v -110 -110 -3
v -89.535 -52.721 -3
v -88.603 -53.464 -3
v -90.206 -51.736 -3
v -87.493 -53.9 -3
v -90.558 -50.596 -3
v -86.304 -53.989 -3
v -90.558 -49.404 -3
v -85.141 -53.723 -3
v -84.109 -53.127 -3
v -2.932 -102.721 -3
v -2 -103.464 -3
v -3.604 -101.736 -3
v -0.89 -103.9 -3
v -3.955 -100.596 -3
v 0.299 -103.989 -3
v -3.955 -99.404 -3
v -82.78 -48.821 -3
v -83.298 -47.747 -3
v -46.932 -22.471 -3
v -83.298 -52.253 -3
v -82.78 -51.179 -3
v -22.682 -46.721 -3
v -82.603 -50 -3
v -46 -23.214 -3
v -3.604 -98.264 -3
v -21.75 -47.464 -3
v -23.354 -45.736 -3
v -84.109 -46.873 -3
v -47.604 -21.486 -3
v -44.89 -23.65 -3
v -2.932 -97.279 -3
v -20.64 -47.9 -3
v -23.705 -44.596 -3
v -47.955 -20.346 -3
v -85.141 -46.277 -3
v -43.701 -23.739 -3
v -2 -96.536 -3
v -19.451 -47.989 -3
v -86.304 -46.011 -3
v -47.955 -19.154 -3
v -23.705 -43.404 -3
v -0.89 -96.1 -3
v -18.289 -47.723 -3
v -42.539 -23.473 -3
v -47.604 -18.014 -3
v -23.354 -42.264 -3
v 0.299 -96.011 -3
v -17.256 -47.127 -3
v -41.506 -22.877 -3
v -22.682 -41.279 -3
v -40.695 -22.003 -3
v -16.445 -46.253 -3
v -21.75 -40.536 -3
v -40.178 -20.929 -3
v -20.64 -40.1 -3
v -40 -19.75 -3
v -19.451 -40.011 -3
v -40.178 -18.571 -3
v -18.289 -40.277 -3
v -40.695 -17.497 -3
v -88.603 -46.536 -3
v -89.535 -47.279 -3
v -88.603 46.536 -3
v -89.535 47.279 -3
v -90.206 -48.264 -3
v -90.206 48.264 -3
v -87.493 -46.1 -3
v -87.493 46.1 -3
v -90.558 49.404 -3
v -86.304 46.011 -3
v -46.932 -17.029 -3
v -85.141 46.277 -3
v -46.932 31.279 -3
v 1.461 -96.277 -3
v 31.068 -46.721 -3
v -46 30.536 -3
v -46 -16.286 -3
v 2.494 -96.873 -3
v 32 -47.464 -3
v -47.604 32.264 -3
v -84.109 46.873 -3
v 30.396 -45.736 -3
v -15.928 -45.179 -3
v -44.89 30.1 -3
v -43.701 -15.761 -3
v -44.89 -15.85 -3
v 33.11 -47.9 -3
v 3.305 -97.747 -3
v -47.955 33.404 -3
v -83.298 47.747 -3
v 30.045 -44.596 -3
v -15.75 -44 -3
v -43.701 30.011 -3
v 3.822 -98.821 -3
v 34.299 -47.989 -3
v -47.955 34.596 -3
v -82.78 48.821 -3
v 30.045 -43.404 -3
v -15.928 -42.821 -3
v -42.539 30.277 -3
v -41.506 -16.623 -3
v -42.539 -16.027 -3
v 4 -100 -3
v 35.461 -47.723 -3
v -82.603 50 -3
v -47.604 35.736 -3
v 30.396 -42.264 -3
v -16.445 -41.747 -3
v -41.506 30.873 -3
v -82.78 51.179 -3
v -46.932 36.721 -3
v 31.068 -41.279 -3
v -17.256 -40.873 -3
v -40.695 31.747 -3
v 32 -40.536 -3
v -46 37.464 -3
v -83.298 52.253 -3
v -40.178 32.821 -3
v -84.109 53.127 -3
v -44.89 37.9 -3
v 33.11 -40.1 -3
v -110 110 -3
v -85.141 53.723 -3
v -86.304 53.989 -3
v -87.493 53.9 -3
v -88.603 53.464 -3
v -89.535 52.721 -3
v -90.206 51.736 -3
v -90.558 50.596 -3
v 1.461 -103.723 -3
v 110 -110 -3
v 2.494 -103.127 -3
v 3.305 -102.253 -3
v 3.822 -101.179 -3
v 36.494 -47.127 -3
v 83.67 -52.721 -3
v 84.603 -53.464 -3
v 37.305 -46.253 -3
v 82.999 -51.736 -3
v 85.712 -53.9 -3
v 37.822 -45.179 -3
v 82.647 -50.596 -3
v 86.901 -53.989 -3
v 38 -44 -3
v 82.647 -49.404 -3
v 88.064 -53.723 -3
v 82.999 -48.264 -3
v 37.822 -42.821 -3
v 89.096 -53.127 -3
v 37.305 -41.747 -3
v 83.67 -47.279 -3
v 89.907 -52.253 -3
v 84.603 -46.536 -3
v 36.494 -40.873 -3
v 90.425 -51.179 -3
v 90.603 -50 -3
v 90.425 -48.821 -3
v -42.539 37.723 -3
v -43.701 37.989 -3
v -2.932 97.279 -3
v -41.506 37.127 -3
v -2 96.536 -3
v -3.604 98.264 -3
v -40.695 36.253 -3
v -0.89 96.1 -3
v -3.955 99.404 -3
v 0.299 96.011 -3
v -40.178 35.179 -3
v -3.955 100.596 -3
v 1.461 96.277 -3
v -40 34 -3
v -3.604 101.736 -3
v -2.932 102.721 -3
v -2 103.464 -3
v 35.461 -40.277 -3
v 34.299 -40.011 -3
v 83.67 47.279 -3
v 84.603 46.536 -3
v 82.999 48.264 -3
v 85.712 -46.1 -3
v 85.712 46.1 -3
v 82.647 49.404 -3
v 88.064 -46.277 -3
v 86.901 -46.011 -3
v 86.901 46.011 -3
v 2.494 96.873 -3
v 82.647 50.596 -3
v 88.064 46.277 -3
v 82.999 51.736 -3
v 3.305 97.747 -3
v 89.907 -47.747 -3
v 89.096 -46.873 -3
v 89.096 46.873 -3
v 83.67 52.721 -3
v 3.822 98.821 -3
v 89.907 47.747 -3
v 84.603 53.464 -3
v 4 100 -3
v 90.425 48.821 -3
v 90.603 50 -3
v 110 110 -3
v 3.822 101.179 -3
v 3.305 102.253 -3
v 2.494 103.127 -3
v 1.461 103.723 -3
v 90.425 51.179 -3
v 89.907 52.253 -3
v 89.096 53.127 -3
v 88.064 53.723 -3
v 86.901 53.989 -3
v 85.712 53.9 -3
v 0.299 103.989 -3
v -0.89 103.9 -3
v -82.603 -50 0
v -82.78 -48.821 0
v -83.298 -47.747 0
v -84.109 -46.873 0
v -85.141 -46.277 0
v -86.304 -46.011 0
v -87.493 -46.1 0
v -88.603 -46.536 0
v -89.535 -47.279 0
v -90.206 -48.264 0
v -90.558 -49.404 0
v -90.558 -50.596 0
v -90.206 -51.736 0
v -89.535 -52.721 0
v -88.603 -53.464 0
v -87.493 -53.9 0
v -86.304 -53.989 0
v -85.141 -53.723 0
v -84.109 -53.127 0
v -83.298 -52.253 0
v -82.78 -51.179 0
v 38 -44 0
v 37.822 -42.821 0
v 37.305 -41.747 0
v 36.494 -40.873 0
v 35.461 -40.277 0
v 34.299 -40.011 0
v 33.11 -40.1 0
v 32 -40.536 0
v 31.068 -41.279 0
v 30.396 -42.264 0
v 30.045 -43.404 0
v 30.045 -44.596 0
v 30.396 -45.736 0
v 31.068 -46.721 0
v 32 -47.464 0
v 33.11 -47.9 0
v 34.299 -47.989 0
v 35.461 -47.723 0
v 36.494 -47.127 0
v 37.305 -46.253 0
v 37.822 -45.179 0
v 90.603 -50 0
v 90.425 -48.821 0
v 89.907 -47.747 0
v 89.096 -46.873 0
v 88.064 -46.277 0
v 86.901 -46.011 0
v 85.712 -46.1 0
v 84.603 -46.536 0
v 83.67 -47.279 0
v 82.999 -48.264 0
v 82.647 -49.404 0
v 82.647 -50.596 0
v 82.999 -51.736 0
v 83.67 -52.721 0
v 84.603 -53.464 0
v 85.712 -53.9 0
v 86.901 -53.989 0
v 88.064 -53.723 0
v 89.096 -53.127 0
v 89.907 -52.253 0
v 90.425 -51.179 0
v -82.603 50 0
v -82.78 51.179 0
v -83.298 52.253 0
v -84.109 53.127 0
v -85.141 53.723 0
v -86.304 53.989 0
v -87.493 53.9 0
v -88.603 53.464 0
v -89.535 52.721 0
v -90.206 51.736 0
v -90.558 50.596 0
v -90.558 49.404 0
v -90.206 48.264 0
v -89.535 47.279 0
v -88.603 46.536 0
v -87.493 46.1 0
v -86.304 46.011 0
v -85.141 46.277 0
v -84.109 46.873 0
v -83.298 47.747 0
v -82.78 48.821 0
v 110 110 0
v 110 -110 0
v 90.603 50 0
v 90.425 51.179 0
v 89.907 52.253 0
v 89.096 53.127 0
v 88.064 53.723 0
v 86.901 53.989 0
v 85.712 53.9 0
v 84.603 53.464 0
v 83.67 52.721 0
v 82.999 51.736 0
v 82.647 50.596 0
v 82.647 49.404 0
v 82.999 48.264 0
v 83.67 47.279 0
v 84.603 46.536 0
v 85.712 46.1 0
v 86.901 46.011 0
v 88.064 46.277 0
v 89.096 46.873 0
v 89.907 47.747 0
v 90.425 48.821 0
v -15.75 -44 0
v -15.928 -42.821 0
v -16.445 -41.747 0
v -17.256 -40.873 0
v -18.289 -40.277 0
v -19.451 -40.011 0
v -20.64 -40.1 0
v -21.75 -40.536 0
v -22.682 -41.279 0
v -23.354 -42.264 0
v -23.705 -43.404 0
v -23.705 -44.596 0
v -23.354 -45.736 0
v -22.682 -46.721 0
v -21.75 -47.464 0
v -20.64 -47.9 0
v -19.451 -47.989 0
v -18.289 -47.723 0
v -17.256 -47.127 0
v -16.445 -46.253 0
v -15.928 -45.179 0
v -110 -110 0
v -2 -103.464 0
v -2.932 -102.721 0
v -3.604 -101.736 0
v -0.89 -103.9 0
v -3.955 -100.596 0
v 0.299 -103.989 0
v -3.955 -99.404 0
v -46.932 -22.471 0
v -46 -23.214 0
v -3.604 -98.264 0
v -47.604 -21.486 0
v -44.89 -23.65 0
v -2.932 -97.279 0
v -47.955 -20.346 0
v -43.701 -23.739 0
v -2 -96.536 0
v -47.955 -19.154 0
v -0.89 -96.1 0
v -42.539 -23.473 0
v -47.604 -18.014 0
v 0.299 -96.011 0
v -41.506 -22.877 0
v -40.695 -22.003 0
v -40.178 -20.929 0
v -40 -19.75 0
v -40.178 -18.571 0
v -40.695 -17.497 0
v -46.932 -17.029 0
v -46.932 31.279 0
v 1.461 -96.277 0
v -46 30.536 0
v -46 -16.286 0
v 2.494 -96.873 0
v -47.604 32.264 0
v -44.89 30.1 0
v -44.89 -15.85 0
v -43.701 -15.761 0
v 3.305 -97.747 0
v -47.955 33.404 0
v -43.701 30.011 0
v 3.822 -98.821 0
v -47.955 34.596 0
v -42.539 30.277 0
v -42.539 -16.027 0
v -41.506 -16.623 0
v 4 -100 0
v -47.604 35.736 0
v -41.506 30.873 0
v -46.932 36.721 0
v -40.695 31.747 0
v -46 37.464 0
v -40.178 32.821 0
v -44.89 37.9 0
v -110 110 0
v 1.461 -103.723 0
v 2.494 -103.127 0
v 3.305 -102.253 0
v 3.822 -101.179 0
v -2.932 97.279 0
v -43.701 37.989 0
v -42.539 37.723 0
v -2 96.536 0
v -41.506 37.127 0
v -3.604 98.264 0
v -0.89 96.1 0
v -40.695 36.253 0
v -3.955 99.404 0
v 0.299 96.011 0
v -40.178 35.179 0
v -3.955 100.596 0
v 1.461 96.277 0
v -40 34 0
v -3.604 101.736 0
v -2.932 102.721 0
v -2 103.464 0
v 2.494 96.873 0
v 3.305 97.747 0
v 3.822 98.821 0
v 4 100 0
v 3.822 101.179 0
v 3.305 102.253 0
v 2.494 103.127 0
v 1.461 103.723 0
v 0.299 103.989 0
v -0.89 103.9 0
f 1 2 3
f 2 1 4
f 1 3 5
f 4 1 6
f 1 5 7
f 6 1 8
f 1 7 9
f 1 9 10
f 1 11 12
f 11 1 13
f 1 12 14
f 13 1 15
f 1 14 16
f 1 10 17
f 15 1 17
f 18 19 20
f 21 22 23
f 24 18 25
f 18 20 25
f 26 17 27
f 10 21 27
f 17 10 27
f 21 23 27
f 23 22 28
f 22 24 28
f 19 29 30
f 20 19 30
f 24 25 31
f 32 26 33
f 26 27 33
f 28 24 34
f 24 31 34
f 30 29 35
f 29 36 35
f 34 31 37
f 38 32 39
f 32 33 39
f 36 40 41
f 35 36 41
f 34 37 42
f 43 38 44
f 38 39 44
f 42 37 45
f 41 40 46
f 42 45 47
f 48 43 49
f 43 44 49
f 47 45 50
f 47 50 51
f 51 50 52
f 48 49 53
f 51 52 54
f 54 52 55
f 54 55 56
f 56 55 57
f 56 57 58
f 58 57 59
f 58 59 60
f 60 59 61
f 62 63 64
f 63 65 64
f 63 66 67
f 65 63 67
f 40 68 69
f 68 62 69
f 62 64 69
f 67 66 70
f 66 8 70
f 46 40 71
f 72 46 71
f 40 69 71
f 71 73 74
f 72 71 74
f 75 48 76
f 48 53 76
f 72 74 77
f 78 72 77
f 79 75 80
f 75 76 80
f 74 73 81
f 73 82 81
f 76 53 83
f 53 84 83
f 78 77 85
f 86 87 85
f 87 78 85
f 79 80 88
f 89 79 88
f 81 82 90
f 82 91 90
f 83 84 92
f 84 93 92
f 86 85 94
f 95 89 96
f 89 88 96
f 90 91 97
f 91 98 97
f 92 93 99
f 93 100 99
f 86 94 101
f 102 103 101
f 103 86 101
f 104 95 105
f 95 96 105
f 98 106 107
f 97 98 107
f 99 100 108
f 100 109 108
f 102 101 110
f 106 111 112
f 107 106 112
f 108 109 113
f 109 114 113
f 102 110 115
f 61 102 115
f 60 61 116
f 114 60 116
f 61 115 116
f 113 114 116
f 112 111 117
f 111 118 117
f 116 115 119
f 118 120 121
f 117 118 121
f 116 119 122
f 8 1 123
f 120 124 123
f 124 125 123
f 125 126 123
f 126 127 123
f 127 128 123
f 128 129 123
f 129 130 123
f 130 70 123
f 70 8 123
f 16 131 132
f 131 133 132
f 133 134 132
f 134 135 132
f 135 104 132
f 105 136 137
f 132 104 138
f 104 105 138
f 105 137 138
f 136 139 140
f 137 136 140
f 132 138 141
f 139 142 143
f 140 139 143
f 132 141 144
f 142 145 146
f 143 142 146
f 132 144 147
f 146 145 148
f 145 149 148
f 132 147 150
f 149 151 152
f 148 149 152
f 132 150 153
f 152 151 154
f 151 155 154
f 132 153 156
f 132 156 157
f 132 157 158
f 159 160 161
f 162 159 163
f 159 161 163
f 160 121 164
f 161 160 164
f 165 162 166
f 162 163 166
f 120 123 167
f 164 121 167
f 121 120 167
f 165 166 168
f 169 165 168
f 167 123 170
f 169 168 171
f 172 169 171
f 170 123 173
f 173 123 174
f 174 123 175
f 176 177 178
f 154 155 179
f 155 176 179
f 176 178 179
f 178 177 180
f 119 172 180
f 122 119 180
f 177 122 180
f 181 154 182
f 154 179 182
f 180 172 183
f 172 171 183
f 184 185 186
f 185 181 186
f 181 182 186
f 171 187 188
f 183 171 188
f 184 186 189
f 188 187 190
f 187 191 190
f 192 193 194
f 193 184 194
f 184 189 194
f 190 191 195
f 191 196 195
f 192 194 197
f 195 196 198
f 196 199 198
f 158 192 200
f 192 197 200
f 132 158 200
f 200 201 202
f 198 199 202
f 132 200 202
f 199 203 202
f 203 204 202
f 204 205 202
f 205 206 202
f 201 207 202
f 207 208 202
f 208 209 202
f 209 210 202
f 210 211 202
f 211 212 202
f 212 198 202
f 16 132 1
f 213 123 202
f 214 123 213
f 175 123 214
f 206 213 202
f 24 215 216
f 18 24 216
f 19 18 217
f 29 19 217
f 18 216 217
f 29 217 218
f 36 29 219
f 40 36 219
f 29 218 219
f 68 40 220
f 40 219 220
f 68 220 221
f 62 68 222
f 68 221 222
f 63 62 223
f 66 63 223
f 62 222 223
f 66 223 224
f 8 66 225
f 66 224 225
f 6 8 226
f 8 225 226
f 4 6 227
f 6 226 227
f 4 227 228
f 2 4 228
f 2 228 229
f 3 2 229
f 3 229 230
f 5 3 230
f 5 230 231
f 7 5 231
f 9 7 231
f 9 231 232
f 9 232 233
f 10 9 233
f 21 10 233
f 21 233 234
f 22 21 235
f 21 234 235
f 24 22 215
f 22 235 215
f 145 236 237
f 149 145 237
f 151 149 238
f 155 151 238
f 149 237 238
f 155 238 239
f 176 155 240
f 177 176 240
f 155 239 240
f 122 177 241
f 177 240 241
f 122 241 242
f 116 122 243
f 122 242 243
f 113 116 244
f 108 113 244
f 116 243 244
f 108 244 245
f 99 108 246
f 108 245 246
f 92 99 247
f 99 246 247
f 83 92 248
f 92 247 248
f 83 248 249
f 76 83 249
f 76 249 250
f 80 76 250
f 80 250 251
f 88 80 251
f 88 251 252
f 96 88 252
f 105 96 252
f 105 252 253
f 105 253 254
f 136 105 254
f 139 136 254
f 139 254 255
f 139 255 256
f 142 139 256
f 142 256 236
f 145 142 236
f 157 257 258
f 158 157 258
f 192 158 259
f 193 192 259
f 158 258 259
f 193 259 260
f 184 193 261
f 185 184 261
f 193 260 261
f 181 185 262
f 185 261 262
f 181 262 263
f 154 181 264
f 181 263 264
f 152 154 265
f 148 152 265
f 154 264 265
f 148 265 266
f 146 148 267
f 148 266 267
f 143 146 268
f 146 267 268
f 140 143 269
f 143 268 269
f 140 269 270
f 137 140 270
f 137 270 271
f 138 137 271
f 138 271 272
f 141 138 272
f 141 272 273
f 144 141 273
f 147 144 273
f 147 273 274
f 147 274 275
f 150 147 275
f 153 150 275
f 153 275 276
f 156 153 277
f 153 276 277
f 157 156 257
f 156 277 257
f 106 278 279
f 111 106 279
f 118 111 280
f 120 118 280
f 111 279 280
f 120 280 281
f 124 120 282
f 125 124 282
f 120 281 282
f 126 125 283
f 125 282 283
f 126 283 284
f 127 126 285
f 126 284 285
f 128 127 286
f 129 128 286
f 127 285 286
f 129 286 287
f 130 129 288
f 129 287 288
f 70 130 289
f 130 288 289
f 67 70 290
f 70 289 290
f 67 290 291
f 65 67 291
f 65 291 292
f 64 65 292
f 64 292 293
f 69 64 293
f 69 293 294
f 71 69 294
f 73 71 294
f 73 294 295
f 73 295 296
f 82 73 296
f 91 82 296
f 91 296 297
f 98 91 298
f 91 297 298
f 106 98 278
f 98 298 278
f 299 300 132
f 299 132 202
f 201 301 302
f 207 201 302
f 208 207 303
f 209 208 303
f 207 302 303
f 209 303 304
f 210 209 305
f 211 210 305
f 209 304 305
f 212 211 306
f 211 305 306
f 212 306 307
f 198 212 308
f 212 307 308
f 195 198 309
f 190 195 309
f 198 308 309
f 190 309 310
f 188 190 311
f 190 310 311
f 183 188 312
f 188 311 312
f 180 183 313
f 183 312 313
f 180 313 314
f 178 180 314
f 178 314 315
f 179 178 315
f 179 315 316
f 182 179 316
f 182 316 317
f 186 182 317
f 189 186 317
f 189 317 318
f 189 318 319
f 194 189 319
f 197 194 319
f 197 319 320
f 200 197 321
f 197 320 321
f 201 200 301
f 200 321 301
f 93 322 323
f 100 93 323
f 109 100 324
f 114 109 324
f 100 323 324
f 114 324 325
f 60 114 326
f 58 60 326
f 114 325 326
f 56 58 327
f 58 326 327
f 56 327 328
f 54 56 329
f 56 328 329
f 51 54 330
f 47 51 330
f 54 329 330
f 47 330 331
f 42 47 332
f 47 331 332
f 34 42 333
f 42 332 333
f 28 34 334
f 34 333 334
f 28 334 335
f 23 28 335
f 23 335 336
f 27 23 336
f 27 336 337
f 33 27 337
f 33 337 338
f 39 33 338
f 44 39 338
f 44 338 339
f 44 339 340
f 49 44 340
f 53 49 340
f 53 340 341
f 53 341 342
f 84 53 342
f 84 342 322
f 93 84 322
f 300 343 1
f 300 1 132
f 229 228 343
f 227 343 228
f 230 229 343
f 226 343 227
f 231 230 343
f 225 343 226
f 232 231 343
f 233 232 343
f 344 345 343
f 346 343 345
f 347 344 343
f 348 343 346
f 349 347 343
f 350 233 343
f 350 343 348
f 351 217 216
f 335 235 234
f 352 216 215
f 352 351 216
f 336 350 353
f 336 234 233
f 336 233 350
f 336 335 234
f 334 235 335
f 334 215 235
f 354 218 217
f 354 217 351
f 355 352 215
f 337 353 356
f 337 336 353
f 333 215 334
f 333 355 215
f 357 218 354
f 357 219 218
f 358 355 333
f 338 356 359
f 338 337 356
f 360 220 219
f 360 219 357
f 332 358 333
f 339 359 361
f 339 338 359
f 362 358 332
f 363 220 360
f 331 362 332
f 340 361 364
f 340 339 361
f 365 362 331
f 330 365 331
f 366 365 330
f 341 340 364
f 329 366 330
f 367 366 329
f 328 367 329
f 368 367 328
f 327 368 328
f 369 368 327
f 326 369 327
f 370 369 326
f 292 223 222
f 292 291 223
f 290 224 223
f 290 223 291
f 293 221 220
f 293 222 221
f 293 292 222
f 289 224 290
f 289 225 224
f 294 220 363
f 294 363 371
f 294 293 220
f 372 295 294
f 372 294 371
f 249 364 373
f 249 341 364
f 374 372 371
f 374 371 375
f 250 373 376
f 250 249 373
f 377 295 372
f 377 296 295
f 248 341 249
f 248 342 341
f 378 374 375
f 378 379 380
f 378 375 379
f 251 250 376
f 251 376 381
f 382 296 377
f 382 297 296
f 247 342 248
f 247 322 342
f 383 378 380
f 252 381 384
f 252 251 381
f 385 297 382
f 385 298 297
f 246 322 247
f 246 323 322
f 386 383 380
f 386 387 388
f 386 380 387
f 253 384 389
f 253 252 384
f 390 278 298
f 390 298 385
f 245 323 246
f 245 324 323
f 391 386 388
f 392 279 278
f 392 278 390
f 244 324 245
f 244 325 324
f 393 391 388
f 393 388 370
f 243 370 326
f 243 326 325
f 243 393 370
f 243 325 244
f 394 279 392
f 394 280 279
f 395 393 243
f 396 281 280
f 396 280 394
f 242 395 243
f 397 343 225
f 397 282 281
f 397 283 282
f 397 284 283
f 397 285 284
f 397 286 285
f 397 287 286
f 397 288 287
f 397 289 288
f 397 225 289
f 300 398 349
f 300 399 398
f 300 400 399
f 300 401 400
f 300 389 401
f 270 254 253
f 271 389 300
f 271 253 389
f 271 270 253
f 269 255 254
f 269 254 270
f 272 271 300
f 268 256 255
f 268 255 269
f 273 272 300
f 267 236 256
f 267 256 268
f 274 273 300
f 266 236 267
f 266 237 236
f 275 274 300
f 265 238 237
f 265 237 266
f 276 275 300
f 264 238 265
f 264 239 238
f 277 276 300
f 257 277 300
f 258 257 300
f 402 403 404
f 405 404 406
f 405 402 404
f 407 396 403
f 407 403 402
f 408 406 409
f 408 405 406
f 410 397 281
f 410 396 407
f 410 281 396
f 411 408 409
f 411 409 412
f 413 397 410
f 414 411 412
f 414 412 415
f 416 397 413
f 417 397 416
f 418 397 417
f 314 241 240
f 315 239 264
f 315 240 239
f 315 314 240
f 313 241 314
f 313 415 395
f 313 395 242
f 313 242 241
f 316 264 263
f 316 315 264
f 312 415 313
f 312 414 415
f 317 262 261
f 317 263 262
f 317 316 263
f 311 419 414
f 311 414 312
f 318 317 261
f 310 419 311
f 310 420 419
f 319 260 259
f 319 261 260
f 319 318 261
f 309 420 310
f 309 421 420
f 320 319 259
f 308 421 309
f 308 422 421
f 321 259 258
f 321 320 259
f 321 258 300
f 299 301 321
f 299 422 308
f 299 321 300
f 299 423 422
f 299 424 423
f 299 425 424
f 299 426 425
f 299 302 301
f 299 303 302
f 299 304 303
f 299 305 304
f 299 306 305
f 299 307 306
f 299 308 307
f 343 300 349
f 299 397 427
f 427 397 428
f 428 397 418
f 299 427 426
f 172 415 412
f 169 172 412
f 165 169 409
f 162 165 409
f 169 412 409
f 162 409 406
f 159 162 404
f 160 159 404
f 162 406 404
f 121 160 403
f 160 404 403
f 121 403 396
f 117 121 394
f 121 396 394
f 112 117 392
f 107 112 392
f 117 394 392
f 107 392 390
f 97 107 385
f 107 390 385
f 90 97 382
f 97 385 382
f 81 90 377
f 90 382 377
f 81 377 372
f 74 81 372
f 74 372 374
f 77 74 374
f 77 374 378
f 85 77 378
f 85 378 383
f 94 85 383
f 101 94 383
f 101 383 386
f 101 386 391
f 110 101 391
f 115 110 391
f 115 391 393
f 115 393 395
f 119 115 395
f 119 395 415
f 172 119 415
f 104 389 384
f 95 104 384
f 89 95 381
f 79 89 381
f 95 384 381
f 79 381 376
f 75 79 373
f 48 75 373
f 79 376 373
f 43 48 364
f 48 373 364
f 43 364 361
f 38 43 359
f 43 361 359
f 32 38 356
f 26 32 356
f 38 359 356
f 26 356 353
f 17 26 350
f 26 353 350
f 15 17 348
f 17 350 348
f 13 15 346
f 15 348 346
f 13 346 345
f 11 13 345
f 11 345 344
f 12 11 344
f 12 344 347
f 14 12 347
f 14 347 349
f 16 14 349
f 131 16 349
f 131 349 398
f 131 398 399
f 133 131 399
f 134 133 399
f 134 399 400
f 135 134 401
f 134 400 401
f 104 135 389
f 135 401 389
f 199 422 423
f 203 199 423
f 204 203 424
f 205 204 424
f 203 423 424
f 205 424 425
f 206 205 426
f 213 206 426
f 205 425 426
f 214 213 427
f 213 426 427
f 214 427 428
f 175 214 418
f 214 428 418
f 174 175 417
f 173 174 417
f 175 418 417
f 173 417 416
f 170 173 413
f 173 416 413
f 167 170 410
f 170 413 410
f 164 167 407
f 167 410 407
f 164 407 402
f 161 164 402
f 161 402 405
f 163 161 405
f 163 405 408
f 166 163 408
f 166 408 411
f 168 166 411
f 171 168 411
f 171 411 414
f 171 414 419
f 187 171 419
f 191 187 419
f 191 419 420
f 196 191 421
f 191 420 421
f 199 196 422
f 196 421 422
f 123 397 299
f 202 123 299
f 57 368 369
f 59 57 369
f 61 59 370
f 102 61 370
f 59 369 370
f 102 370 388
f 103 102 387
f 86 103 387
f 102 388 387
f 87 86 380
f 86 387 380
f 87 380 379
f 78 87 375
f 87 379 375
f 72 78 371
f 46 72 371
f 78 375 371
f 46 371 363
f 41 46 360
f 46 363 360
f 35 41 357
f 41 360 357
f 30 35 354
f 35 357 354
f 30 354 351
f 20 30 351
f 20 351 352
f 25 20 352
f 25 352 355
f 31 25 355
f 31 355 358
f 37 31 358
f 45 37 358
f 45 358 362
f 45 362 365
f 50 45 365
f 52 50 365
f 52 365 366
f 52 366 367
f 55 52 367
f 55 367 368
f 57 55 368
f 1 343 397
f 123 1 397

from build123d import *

# Parameters (mm, degrees)
SCHIZZO1_W               = 220
SCHIZZO1_H               = 220
SCHIZZO1_R               = 4
BASE_FLANGIA1_DEPTH      = 3
SCHIZZO2_R               = 4
TAGLIO_ESTRUSIONE1_DEPTH = 156.592416268


# Sheet-metal steps are written as plain solids
with BuildPart() as part:
    # Schizzo1 → Base-Flangia1 (new body)
    with BuildSketch(Plane.XY):
        Rectangle(SCHIZZO1_W, SCHIZZO1_H)
        with Locations((0, 100)):
            Circle(SCHIZZO1_R, mode=Mode.SUBTRACT)
        with Locations((86.602540378, 50)):
            Circle(SCHIZZO1_R, mode=Mode.SUBTRACT)
        with Locations((86.602540378, -50)):
            Circle(SCHIZZO1_R, mode=Mode.SUBTRACT)
        with Locations((0, -100)):
            Circle(SCHIZZO1_R, mode=Mode.SUBTRACT)
        with Locations((-86.602540378, -50)):
            Circle(SCHIZZO1_R, mode=Mode.SUBTRACT)
        with Locations((-86.602540378, 50)):
            Circle(SCHIZZO1_R, mode=Mode.SUBTRACT)
    extrude(amount=-BASE_FLANGIA1_DEPTH)

    # Schizzo2 → Taglio-Estrusione1 (cut, through all)
    with BuildSketch(Plane.XY):
        with Locations((-19.75, -44)):
            Circle(SCHIZZO2_R)
        with Locations((-44, -19.75)):
            Circle(SCHIZZO2_R)
        with Locations((-44, 34)):
            Circle(SCHIZZO2_R)
        with Locations((34, -44)):
            Circle(SCHIZZO2_R)
    extrude(amount=-TAGLIO_ESTRUSIONE1_DEPTH, mode=Mode.SUBTRACT)


solid = part.part
